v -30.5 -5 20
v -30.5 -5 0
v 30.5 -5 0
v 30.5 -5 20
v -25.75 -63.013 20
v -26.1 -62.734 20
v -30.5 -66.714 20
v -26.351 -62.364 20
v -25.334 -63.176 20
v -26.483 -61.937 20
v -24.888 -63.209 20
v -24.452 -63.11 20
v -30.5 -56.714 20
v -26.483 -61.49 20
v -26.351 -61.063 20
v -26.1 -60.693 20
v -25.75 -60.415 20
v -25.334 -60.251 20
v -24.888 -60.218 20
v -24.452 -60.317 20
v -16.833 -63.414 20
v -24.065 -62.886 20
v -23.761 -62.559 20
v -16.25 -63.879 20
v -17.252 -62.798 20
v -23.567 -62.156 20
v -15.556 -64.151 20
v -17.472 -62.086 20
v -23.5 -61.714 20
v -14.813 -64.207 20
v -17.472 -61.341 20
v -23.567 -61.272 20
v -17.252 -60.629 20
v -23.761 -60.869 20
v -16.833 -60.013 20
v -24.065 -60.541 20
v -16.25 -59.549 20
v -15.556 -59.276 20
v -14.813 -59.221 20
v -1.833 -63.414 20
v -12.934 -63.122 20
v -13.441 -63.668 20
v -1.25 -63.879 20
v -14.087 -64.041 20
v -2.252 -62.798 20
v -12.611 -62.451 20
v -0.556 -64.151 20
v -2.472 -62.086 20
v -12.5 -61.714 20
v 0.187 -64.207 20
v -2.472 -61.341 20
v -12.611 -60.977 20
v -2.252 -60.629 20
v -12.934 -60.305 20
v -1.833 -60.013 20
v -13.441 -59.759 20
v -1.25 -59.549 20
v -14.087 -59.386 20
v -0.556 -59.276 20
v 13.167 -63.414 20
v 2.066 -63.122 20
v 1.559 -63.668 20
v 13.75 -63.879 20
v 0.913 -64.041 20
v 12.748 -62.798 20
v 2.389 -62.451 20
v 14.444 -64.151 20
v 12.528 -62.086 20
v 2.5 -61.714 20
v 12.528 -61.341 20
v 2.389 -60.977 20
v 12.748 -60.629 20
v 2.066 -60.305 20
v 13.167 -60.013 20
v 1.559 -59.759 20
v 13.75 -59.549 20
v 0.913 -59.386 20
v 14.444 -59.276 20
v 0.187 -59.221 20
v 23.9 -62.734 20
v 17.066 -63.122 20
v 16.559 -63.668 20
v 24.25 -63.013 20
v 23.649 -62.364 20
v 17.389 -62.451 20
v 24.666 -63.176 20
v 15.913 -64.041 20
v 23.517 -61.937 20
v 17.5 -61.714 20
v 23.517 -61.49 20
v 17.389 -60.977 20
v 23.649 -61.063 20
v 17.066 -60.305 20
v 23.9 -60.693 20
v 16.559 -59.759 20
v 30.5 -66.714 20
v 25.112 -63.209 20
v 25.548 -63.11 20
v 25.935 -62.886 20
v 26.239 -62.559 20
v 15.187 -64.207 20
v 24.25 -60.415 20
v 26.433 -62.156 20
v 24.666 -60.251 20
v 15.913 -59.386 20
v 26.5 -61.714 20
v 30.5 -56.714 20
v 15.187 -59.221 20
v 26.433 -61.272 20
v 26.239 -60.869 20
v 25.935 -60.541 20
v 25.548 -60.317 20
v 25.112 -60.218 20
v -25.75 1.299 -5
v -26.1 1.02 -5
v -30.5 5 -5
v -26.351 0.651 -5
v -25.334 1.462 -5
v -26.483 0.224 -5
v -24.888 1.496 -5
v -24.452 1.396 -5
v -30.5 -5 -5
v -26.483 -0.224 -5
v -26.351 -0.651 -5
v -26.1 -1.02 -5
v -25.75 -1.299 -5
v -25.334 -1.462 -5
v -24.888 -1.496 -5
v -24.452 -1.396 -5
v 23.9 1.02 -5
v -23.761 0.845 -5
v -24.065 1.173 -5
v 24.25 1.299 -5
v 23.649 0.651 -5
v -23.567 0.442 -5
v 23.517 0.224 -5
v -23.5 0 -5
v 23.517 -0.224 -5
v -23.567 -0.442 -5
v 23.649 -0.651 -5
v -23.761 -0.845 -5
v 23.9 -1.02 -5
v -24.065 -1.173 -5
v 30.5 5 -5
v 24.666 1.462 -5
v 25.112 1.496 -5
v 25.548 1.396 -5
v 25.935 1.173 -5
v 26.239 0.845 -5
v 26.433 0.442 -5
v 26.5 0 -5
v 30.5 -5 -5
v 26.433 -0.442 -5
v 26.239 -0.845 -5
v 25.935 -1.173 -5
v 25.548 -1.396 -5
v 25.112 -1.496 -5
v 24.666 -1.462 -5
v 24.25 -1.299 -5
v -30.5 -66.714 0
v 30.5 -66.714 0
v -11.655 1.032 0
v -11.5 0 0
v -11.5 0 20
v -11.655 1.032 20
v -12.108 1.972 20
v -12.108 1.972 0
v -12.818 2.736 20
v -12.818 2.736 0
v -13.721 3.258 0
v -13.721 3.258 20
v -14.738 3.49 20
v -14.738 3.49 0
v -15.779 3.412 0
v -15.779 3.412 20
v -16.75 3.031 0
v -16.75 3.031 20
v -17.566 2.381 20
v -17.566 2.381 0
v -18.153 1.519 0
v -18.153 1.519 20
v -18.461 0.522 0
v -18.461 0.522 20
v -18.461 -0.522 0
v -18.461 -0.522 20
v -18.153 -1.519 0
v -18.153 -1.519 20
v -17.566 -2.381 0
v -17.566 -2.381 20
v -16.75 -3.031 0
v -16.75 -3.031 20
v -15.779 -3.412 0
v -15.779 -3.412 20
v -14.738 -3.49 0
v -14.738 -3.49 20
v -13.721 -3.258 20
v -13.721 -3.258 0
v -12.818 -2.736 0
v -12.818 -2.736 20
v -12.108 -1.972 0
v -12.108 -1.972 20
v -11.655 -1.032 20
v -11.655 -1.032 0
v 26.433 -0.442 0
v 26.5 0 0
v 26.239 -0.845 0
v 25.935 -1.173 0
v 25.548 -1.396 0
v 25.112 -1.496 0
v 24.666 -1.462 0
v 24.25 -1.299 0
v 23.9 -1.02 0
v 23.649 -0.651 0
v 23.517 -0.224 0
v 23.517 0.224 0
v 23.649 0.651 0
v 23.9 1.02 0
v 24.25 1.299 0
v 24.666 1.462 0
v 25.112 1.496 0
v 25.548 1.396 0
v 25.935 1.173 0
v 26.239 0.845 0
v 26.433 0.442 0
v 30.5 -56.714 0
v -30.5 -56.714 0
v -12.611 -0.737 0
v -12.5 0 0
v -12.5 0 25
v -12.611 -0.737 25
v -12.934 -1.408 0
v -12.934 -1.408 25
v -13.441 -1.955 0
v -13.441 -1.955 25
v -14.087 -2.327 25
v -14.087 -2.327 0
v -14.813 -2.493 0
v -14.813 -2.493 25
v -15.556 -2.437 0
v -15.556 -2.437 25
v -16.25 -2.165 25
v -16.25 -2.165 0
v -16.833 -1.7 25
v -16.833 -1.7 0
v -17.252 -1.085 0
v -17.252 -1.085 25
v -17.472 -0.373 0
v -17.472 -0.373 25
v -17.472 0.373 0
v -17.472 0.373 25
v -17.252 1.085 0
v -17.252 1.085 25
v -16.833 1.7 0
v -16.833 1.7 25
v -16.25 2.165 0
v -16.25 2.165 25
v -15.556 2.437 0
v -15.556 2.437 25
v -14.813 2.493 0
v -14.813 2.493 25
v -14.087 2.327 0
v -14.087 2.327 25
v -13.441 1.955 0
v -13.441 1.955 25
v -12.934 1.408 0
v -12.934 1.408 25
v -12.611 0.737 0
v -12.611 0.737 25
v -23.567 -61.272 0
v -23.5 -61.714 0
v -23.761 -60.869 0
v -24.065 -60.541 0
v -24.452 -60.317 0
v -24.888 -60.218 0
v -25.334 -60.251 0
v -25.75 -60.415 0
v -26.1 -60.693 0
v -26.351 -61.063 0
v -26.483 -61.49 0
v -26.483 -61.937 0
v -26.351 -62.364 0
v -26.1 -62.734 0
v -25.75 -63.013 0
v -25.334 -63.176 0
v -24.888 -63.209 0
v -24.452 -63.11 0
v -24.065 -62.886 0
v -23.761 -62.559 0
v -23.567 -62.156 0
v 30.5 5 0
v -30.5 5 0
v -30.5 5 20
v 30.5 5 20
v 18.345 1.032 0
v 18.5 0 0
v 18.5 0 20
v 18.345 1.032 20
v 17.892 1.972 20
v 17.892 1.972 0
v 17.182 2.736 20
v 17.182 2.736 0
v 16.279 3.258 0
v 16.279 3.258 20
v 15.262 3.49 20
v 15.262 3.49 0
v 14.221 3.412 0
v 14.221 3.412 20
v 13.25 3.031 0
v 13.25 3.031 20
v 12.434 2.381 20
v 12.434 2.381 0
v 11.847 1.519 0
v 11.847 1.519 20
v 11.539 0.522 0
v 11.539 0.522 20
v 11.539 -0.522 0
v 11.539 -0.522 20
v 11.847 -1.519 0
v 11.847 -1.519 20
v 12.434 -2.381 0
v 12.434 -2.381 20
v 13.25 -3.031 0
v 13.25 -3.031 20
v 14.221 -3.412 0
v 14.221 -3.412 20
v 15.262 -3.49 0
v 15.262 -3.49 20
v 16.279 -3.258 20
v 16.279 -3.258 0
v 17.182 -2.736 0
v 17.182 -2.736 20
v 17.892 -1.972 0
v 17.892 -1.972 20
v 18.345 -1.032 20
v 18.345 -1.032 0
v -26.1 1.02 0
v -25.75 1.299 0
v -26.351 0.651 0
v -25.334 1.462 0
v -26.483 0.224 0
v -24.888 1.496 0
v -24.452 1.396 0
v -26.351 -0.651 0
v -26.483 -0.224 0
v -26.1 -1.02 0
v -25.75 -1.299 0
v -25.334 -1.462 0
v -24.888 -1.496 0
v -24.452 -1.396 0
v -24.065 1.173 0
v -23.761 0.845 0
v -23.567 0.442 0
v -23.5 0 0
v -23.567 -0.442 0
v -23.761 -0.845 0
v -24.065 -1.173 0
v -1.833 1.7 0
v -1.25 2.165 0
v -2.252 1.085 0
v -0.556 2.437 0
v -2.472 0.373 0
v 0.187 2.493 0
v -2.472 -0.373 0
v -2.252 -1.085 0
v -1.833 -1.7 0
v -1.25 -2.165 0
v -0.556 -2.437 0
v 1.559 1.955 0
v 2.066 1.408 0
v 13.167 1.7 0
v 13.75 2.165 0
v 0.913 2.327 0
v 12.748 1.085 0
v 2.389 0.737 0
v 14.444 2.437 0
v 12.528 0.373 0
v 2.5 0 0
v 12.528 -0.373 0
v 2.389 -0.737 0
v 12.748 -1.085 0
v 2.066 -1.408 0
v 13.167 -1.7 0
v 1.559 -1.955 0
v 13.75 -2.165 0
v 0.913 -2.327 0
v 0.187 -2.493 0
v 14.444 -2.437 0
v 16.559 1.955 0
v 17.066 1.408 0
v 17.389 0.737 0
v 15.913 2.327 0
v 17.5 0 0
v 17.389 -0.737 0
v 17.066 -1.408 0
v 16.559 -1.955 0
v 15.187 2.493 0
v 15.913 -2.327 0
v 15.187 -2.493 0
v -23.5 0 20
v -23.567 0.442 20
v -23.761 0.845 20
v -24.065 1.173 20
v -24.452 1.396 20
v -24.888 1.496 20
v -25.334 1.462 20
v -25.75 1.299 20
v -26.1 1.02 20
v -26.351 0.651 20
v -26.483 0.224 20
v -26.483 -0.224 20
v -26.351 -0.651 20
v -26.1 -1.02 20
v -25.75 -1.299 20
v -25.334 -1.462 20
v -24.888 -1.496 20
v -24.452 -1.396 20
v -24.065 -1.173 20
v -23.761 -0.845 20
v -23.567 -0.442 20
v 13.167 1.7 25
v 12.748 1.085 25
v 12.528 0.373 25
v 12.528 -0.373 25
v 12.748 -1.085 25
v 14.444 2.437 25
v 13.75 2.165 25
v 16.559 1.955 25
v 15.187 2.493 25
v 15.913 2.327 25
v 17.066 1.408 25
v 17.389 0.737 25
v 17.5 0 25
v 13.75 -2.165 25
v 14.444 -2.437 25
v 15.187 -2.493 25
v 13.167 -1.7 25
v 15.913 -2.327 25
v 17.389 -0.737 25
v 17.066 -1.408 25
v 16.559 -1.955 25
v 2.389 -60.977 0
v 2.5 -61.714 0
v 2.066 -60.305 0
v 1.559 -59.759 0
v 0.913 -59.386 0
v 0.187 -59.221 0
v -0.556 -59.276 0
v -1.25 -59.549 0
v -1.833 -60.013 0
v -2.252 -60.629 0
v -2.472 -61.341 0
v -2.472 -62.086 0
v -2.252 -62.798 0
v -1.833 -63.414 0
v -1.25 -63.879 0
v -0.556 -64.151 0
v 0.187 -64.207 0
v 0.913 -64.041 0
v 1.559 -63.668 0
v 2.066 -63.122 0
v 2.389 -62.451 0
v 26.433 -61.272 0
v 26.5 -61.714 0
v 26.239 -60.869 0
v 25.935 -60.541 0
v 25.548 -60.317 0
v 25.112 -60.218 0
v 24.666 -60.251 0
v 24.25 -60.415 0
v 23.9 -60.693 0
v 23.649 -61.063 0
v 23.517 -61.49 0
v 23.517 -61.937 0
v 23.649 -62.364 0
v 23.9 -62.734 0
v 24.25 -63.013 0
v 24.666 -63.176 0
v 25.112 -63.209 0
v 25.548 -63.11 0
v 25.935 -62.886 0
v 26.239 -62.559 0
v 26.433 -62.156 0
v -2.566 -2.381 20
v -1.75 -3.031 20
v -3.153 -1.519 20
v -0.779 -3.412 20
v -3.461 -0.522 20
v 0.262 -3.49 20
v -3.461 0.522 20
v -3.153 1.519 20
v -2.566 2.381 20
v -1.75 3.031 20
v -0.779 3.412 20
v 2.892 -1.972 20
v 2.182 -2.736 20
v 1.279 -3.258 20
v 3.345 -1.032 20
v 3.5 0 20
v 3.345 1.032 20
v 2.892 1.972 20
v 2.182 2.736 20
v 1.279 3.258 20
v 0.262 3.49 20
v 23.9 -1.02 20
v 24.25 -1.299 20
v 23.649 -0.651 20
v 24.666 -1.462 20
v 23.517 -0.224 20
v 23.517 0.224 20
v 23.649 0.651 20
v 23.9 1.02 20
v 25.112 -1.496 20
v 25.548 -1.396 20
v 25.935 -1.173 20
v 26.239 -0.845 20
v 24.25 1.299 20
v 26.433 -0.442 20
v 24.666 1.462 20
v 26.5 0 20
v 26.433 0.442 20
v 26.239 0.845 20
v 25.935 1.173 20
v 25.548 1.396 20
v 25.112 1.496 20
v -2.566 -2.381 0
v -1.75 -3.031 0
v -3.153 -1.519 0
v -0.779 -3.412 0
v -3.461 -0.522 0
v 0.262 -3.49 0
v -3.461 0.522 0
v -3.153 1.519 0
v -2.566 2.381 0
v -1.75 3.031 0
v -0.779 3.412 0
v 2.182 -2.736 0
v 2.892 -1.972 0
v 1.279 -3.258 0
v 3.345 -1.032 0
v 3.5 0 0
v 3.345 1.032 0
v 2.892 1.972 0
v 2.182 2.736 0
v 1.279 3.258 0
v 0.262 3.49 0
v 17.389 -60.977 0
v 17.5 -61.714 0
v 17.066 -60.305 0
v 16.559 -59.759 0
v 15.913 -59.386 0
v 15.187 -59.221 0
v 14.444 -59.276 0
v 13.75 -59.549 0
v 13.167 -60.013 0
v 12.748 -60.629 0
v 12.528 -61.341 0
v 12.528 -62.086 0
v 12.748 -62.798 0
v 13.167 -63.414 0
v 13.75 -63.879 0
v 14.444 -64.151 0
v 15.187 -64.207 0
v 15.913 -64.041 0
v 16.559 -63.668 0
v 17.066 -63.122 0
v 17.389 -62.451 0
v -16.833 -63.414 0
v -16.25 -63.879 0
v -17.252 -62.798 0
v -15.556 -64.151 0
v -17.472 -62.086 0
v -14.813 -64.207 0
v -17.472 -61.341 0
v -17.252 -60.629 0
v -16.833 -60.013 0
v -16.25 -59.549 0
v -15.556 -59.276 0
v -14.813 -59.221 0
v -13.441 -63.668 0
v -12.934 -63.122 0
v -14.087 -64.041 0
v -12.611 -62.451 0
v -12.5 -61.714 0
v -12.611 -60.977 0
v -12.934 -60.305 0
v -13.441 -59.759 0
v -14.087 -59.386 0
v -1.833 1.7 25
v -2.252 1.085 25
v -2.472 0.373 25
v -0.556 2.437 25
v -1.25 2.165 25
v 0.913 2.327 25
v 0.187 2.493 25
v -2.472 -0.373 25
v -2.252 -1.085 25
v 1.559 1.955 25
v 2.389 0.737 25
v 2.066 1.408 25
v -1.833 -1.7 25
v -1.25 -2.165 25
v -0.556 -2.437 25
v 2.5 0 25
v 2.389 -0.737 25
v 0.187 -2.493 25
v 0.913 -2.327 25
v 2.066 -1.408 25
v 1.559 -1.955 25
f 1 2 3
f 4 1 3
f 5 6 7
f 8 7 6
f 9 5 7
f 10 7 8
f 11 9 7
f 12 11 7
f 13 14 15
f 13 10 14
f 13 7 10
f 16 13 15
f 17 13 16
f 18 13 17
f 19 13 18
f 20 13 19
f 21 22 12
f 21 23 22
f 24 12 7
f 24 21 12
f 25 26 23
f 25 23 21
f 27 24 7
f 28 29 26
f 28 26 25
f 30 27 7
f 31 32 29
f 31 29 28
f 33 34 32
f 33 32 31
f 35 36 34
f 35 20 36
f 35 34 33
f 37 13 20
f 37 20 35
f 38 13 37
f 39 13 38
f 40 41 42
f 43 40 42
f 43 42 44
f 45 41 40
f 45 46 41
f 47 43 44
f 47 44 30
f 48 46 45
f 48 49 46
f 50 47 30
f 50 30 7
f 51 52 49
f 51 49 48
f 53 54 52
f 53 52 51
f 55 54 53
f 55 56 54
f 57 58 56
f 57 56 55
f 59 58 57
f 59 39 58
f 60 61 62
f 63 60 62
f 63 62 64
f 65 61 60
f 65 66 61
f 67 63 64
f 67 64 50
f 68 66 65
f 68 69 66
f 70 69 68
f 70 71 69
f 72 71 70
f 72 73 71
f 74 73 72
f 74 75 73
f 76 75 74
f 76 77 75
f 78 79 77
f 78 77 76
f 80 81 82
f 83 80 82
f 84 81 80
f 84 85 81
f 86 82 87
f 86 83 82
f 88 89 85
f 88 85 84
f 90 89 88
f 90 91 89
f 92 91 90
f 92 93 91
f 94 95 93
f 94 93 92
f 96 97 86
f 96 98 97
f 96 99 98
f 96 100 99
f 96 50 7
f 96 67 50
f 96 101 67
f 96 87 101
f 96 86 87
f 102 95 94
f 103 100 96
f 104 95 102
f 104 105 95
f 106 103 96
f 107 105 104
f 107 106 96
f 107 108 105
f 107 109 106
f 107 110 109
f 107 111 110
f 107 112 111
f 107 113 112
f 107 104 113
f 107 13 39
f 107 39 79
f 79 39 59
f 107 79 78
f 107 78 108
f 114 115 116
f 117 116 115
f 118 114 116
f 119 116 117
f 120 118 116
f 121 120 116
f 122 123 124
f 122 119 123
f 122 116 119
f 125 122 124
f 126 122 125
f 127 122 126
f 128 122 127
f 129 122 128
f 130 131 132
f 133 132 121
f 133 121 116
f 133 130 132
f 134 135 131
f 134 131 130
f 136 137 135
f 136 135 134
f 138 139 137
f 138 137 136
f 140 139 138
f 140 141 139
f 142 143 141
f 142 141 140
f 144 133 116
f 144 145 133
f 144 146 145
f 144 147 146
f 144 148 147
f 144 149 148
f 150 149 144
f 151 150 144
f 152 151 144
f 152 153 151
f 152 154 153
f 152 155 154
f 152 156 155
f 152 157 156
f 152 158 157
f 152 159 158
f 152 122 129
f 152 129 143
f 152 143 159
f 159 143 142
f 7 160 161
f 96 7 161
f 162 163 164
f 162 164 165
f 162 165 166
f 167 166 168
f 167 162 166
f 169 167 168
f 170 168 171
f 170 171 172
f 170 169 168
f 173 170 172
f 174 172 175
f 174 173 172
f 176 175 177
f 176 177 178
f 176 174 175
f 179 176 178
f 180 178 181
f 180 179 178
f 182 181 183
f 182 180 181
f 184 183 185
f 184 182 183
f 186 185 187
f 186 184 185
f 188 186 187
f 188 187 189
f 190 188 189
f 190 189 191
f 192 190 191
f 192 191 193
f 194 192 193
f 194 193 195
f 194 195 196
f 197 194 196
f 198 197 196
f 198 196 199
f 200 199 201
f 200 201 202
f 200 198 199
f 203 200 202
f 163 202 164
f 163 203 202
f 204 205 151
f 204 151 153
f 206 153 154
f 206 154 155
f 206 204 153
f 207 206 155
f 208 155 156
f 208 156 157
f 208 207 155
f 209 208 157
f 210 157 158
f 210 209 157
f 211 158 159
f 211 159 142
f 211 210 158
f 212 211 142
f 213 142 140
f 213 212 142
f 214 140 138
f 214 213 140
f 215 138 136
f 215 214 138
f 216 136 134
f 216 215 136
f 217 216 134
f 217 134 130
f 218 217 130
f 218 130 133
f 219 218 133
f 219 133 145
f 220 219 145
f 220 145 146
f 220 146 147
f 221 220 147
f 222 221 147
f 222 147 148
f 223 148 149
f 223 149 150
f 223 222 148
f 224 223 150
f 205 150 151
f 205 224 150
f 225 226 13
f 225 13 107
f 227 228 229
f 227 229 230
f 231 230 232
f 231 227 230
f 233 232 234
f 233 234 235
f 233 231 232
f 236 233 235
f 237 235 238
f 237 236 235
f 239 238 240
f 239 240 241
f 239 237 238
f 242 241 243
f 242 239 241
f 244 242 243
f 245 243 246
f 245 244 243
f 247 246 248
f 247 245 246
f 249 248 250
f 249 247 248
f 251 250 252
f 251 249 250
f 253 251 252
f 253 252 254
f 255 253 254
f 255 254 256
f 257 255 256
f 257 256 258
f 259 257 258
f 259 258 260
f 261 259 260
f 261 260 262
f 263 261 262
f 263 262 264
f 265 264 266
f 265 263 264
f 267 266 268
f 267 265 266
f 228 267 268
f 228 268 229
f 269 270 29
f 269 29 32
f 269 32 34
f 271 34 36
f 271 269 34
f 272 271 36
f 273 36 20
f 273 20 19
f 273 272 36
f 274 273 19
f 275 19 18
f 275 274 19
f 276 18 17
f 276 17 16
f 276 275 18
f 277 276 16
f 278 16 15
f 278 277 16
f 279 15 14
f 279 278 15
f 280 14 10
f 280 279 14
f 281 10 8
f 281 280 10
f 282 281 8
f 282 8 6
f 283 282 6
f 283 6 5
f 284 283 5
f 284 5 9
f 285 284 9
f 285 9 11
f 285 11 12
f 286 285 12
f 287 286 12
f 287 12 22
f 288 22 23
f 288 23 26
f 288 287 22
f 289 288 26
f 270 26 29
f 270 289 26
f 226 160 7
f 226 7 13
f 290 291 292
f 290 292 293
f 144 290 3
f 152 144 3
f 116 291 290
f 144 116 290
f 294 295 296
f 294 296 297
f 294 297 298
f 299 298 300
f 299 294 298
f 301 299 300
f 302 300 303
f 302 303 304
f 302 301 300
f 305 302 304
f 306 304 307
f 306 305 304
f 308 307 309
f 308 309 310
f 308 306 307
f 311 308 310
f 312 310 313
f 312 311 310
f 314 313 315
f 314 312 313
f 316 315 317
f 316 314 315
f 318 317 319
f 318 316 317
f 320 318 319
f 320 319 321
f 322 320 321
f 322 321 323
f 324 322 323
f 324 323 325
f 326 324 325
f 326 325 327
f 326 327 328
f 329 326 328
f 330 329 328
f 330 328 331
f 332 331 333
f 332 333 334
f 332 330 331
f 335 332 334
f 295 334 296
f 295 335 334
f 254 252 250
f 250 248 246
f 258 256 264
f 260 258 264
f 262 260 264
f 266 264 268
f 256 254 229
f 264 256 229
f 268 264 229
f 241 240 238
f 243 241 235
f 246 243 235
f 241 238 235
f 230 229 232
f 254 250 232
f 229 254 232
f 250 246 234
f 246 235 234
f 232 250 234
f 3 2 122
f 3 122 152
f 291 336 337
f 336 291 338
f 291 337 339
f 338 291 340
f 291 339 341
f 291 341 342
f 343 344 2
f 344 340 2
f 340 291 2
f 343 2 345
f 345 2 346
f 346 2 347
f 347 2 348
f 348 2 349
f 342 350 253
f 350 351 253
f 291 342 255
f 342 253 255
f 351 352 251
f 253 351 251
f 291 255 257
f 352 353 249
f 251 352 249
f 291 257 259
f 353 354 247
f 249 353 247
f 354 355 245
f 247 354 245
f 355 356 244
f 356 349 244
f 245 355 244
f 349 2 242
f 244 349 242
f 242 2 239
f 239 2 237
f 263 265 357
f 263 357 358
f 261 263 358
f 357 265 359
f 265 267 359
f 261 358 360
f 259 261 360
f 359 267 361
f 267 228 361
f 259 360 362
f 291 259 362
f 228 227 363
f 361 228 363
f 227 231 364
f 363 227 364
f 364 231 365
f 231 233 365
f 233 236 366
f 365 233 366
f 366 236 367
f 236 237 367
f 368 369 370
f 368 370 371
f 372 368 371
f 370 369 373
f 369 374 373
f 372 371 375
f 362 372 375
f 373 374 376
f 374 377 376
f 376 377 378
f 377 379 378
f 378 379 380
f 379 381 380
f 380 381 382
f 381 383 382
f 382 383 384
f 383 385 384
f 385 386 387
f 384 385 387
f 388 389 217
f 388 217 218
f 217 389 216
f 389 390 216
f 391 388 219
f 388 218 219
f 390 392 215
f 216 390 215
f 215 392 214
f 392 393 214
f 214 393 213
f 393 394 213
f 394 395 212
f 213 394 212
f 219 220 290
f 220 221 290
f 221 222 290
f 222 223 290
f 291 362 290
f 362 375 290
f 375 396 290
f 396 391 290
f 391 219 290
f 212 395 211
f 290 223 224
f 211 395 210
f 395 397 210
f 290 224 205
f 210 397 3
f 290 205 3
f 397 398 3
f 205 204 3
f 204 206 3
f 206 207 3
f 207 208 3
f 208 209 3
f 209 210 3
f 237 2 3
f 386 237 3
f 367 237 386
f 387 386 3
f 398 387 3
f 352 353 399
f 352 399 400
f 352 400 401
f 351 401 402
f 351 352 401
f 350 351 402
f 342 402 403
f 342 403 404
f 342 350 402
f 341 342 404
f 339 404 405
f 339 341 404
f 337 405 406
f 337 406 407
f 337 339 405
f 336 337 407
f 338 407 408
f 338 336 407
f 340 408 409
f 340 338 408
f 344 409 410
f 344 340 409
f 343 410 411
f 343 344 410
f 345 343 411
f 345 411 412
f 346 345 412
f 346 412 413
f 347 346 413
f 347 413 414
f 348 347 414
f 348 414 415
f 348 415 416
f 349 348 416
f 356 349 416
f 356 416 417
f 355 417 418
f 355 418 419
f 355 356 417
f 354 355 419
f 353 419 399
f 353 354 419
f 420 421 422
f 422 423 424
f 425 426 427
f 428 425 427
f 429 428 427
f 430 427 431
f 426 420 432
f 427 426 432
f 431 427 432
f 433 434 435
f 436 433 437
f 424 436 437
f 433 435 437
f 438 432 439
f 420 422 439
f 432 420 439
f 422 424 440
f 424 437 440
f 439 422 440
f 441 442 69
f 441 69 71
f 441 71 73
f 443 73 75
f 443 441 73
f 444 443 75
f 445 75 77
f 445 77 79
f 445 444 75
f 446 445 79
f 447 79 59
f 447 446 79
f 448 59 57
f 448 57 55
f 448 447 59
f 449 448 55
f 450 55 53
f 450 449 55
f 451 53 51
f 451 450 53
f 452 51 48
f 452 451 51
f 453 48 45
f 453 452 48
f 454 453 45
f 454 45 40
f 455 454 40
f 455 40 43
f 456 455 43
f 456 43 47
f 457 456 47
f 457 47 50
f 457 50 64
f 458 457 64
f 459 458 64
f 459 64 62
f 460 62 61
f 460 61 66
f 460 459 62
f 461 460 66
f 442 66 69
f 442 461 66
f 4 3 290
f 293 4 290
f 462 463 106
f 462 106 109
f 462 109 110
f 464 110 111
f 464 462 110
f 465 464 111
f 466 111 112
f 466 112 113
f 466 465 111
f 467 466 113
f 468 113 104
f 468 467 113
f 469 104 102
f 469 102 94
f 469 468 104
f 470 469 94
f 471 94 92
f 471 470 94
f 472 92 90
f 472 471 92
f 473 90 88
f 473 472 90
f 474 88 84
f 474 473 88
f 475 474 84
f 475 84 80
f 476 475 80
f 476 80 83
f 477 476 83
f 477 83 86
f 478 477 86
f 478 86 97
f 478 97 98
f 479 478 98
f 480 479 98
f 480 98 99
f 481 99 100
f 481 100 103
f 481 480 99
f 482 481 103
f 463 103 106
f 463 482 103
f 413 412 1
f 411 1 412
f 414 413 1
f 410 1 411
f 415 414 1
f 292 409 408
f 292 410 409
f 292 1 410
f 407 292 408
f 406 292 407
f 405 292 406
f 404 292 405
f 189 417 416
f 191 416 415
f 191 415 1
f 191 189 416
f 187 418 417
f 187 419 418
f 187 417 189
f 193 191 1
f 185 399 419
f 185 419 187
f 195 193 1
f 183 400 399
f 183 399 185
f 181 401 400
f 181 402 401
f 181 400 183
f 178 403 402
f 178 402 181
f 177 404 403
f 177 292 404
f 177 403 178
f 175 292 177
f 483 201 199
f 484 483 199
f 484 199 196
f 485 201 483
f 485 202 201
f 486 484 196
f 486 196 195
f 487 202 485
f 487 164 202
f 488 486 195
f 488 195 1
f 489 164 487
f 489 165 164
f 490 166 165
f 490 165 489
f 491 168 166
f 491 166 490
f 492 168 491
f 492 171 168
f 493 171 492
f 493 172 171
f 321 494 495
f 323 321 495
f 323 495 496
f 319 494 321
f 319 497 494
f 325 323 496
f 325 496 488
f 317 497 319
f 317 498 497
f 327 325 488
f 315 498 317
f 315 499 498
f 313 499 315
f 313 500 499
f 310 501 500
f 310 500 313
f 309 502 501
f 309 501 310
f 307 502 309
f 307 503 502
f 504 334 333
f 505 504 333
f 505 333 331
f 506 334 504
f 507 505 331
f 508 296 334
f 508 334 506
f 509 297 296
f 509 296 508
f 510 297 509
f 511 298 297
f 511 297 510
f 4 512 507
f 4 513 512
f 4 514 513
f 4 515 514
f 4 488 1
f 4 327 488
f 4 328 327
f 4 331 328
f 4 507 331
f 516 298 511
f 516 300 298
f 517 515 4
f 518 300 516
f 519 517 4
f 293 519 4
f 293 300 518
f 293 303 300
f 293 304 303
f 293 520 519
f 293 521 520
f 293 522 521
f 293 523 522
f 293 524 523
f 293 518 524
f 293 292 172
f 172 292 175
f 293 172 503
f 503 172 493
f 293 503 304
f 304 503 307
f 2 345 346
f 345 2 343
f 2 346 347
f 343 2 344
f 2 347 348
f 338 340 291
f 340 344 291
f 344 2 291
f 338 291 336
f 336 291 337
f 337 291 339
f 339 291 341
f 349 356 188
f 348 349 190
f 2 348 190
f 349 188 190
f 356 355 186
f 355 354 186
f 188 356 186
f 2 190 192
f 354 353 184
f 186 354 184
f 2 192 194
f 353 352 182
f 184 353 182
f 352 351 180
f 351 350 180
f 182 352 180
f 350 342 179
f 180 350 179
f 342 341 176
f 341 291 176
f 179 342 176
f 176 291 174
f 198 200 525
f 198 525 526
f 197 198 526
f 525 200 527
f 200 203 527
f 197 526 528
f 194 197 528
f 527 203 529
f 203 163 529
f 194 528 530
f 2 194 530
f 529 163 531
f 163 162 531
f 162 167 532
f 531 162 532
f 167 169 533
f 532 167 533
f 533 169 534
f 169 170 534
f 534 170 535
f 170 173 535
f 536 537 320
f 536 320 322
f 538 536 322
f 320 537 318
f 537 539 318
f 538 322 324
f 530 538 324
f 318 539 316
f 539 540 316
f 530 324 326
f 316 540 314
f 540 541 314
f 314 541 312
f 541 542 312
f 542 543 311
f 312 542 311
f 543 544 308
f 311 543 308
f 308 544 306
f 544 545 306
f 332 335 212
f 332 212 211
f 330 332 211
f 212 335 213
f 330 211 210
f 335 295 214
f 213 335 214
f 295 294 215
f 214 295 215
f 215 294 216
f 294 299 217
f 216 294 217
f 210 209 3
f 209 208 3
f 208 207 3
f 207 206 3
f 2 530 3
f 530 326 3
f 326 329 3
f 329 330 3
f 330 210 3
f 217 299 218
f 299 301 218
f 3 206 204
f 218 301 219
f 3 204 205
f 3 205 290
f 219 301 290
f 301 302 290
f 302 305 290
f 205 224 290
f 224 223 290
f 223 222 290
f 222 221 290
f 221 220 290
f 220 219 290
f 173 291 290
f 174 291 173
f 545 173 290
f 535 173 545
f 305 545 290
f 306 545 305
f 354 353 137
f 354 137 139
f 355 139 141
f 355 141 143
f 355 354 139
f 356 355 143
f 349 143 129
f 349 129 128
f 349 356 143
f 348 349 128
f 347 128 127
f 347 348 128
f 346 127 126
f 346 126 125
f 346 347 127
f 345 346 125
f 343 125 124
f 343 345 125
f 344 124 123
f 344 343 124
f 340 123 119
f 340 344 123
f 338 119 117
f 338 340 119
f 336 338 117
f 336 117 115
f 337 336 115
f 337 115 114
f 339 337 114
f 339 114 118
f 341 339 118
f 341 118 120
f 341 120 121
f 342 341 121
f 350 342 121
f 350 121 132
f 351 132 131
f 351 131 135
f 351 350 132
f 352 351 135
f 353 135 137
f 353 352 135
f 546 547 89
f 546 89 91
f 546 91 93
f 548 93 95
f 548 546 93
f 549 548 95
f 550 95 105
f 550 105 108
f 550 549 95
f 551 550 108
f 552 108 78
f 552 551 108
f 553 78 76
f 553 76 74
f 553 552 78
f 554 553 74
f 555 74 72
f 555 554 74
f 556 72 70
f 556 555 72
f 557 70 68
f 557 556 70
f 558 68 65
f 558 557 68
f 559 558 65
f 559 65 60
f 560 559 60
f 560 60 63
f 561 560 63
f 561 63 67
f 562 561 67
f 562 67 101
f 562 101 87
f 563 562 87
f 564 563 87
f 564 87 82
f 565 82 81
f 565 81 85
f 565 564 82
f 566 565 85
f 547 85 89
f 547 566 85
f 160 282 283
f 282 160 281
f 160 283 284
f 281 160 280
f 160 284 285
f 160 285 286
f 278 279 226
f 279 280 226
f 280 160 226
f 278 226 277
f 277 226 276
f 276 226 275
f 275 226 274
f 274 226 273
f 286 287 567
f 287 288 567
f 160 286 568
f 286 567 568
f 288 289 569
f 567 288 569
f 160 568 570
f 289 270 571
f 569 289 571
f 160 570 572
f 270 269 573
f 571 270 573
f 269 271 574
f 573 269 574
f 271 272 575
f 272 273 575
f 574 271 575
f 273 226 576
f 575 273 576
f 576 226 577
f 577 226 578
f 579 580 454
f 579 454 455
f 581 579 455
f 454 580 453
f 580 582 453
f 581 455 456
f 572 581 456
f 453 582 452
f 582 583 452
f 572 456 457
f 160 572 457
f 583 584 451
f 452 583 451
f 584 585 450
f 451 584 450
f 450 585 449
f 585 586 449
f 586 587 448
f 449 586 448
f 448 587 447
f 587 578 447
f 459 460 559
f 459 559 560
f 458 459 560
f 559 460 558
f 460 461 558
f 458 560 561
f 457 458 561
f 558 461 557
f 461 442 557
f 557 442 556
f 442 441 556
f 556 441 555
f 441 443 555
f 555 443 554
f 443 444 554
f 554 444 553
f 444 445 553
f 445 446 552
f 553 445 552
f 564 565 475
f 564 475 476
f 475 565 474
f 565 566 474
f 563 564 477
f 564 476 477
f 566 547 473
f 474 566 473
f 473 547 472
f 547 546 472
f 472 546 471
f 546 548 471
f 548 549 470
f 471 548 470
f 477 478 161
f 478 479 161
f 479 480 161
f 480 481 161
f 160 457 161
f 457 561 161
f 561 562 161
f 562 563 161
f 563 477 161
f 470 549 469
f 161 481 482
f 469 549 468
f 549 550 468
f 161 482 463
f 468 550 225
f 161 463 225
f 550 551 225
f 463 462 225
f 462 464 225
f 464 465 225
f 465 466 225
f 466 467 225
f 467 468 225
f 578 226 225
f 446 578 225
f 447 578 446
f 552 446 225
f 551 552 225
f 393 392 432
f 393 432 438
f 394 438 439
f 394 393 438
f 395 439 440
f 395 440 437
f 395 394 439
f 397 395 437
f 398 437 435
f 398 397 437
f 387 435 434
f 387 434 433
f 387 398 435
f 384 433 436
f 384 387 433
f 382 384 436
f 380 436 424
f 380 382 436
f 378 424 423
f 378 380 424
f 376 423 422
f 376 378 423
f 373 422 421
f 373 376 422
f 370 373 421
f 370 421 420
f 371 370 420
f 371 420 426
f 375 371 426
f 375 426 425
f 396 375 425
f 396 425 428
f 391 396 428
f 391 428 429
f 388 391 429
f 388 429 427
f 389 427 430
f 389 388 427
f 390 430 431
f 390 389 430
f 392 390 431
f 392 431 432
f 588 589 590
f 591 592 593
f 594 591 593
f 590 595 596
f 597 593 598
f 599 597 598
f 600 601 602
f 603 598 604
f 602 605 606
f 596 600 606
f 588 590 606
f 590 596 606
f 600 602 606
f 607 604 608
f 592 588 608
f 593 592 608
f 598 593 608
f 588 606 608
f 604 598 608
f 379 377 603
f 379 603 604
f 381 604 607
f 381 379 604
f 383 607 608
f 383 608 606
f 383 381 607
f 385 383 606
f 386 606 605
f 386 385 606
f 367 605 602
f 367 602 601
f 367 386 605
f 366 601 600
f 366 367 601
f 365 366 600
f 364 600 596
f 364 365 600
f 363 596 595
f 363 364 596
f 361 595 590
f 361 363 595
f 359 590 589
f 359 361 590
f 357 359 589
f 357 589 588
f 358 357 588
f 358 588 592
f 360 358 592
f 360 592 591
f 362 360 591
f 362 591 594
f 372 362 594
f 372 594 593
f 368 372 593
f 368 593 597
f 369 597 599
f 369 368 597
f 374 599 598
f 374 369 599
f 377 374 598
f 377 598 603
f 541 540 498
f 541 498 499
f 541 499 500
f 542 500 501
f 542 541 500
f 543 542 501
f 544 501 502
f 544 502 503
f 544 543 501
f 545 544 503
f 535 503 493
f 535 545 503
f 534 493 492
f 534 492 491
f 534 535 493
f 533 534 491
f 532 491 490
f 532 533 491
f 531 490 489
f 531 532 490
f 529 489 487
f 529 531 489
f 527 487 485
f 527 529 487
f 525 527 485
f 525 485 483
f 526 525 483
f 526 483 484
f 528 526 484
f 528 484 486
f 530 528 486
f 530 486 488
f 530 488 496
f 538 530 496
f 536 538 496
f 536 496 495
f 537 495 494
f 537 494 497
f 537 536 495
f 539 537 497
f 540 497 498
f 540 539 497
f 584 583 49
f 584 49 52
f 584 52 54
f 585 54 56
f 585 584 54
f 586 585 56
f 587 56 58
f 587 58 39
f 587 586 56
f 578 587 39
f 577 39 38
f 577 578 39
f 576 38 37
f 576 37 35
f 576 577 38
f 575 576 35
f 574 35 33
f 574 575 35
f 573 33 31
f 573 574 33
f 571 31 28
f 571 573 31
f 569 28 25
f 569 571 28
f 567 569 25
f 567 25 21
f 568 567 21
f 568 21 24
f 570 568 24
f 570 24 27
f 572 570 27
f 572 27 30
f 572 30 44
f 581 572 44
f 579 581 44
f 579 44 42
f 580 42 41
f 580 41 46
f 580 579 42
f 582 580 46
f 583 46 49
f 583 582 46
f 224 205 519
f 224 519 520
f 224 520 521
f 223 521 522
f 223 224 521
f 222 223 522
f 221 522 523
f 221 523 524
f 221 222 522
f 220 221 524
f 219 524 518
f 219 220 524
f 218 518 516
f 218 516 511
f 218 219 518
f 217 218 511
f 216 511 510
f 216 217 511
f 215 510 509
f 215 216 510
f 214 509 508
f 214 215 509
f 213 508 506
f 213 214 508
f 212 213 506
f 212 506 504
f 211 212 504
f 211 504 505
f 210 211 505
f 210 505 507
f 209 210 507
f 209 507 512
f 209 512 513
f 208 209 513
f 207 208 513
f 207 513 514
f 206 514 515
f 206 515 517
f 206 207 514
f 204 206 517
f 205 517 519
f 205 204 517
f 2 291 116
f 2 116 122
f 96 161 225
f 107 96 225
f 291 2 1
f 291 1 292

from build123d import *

# Parameters (mm, degrees)
F0_W          = 61
F0_H          = 10
F0_R          = 1.5
F0_R_2        = 3.5
F1_DEPTH      = 20
F2_W          = 61
F2_H          = 10
F2_R          = 1.5
F2_R_2        = 3.5
F2_R_3        = 2.5
F3_DEPTH      = 5
F4_DEPTH      = 25
F4_DEPTH_BACK = 5
F5_W          = 61
F5_H          = 10
F5_R          = 1.5
F5_R_2        = 2.5
F6_DEPTH      = 20


with BuildPart() as f1:
    # F0 (on Top) → F1 (new body)
    with BuildSketch(Plane.XY):
        Rectangle(F0_W, F0_H)
        with Locations((-25, 0)):
            Circle(F0_R, mode=Mode.SUBTRACT)
        with Locations((-15, 0)):
            Circle(F0_R_2, mode=Mode.SUBTRACT)
        Circle(F0_R_2, mode=Mode.SUBTRACT)
        with Locations((15, 0)):
            Circle(F0_R_2, mode=Mode.SUBTRACT)
        with Locations((25, 0)):
            Circle(F0_R, mode=Mode.SUBTRACT)
    extrude(amount=F1_DEPTH)


with BuildPart() as f3:
    # F2 (on face) → F3 (new body)
    with BuildSketch(Plane(origin=(0, 0, 0), x_dir=(1, 0, 0), z_dir=(0, 0, -1))):
        Rectangle(F2_W, F2_H)
        with Locations((-25, 0)):
            Circle(F2_R, mode=Mode.SUBTRACT)
        with Locations((-15, 0)):
            Circle(F2_R_2, mode=Mode.SUBTRACT)
        Circle(F2_R_2, mode=Mode.SUBTRACT)
        with Locations((15, 0)):
            Circle(F2_R_2, mode=Mode.SUBTRACT)
        with Locations((25, 0)):
            Circle(F2_R, mode=Mode.SUBTRACT)
        with Locations((-15, 0)):
            Circle(F2_R_2)
        with Locations((-15, 0)):
            Circle(F2_R_3, mode=Mode.SUBTRACT)
        Circle(F2_R_2)
        Circle(F2_R_3, mode=Mode.SUBTRACT)
        with Locations((15, 0)):
            Circle(F2_R_2)
        with Locations((15, 0)):
            Circle(F2_R_3, mode=Mode.SUBTRACT)
    extrude(amount=F3_DEPTH)

    # F2 (on face) → F4 (join, two sides)
    with BuildSketch(Plane(origin=(0, 0, 0), x_dir=(1, 0, 0), z_dir=(0, 0, -1))) as f4_sk:
        with Locations((15, 0)):
            Circle(F2_R_3)
        Circle(F2_R_3)
        with Locations((-15, 0)):
            Circle(F2_R_3)
    extrude(amount=-F4_DEPTH)
    extrude(f4_sk.sketch, amount=F4_DEPTH_BACK)


with BuildPart() as f6:
    # F5 (on Top) → F6 (new body)
    with BuildSketch(Plane.XY):
        with Locations((0, -61.713668406)):
            Rectangle(F5_W, F5_H)
        with Locations((-25, -61.713668406)):
            Circle(F5_R, mode=Mode.SUBTRACT)
        with Locations((-15, -61.713668406)):
            Circle(F5_R_2, mode=Mode.SUBTRACT)
        with Locations((0, -61.713668406)):
            Circle(F5_R_2, mode=Mode.SUBTRACT)
        with Locations((15, -61.713668406)):
            Circle(F5_R_2, mode=Mode.SUBTRACT)
        with Locations((25, -61.713668406)):
            Circle(F5_R, mode=Mode.SUBTRACT)
    extrude(amount=F6_DEPTH)


solid = Compound([f1.part, f3.part, f6.part])
